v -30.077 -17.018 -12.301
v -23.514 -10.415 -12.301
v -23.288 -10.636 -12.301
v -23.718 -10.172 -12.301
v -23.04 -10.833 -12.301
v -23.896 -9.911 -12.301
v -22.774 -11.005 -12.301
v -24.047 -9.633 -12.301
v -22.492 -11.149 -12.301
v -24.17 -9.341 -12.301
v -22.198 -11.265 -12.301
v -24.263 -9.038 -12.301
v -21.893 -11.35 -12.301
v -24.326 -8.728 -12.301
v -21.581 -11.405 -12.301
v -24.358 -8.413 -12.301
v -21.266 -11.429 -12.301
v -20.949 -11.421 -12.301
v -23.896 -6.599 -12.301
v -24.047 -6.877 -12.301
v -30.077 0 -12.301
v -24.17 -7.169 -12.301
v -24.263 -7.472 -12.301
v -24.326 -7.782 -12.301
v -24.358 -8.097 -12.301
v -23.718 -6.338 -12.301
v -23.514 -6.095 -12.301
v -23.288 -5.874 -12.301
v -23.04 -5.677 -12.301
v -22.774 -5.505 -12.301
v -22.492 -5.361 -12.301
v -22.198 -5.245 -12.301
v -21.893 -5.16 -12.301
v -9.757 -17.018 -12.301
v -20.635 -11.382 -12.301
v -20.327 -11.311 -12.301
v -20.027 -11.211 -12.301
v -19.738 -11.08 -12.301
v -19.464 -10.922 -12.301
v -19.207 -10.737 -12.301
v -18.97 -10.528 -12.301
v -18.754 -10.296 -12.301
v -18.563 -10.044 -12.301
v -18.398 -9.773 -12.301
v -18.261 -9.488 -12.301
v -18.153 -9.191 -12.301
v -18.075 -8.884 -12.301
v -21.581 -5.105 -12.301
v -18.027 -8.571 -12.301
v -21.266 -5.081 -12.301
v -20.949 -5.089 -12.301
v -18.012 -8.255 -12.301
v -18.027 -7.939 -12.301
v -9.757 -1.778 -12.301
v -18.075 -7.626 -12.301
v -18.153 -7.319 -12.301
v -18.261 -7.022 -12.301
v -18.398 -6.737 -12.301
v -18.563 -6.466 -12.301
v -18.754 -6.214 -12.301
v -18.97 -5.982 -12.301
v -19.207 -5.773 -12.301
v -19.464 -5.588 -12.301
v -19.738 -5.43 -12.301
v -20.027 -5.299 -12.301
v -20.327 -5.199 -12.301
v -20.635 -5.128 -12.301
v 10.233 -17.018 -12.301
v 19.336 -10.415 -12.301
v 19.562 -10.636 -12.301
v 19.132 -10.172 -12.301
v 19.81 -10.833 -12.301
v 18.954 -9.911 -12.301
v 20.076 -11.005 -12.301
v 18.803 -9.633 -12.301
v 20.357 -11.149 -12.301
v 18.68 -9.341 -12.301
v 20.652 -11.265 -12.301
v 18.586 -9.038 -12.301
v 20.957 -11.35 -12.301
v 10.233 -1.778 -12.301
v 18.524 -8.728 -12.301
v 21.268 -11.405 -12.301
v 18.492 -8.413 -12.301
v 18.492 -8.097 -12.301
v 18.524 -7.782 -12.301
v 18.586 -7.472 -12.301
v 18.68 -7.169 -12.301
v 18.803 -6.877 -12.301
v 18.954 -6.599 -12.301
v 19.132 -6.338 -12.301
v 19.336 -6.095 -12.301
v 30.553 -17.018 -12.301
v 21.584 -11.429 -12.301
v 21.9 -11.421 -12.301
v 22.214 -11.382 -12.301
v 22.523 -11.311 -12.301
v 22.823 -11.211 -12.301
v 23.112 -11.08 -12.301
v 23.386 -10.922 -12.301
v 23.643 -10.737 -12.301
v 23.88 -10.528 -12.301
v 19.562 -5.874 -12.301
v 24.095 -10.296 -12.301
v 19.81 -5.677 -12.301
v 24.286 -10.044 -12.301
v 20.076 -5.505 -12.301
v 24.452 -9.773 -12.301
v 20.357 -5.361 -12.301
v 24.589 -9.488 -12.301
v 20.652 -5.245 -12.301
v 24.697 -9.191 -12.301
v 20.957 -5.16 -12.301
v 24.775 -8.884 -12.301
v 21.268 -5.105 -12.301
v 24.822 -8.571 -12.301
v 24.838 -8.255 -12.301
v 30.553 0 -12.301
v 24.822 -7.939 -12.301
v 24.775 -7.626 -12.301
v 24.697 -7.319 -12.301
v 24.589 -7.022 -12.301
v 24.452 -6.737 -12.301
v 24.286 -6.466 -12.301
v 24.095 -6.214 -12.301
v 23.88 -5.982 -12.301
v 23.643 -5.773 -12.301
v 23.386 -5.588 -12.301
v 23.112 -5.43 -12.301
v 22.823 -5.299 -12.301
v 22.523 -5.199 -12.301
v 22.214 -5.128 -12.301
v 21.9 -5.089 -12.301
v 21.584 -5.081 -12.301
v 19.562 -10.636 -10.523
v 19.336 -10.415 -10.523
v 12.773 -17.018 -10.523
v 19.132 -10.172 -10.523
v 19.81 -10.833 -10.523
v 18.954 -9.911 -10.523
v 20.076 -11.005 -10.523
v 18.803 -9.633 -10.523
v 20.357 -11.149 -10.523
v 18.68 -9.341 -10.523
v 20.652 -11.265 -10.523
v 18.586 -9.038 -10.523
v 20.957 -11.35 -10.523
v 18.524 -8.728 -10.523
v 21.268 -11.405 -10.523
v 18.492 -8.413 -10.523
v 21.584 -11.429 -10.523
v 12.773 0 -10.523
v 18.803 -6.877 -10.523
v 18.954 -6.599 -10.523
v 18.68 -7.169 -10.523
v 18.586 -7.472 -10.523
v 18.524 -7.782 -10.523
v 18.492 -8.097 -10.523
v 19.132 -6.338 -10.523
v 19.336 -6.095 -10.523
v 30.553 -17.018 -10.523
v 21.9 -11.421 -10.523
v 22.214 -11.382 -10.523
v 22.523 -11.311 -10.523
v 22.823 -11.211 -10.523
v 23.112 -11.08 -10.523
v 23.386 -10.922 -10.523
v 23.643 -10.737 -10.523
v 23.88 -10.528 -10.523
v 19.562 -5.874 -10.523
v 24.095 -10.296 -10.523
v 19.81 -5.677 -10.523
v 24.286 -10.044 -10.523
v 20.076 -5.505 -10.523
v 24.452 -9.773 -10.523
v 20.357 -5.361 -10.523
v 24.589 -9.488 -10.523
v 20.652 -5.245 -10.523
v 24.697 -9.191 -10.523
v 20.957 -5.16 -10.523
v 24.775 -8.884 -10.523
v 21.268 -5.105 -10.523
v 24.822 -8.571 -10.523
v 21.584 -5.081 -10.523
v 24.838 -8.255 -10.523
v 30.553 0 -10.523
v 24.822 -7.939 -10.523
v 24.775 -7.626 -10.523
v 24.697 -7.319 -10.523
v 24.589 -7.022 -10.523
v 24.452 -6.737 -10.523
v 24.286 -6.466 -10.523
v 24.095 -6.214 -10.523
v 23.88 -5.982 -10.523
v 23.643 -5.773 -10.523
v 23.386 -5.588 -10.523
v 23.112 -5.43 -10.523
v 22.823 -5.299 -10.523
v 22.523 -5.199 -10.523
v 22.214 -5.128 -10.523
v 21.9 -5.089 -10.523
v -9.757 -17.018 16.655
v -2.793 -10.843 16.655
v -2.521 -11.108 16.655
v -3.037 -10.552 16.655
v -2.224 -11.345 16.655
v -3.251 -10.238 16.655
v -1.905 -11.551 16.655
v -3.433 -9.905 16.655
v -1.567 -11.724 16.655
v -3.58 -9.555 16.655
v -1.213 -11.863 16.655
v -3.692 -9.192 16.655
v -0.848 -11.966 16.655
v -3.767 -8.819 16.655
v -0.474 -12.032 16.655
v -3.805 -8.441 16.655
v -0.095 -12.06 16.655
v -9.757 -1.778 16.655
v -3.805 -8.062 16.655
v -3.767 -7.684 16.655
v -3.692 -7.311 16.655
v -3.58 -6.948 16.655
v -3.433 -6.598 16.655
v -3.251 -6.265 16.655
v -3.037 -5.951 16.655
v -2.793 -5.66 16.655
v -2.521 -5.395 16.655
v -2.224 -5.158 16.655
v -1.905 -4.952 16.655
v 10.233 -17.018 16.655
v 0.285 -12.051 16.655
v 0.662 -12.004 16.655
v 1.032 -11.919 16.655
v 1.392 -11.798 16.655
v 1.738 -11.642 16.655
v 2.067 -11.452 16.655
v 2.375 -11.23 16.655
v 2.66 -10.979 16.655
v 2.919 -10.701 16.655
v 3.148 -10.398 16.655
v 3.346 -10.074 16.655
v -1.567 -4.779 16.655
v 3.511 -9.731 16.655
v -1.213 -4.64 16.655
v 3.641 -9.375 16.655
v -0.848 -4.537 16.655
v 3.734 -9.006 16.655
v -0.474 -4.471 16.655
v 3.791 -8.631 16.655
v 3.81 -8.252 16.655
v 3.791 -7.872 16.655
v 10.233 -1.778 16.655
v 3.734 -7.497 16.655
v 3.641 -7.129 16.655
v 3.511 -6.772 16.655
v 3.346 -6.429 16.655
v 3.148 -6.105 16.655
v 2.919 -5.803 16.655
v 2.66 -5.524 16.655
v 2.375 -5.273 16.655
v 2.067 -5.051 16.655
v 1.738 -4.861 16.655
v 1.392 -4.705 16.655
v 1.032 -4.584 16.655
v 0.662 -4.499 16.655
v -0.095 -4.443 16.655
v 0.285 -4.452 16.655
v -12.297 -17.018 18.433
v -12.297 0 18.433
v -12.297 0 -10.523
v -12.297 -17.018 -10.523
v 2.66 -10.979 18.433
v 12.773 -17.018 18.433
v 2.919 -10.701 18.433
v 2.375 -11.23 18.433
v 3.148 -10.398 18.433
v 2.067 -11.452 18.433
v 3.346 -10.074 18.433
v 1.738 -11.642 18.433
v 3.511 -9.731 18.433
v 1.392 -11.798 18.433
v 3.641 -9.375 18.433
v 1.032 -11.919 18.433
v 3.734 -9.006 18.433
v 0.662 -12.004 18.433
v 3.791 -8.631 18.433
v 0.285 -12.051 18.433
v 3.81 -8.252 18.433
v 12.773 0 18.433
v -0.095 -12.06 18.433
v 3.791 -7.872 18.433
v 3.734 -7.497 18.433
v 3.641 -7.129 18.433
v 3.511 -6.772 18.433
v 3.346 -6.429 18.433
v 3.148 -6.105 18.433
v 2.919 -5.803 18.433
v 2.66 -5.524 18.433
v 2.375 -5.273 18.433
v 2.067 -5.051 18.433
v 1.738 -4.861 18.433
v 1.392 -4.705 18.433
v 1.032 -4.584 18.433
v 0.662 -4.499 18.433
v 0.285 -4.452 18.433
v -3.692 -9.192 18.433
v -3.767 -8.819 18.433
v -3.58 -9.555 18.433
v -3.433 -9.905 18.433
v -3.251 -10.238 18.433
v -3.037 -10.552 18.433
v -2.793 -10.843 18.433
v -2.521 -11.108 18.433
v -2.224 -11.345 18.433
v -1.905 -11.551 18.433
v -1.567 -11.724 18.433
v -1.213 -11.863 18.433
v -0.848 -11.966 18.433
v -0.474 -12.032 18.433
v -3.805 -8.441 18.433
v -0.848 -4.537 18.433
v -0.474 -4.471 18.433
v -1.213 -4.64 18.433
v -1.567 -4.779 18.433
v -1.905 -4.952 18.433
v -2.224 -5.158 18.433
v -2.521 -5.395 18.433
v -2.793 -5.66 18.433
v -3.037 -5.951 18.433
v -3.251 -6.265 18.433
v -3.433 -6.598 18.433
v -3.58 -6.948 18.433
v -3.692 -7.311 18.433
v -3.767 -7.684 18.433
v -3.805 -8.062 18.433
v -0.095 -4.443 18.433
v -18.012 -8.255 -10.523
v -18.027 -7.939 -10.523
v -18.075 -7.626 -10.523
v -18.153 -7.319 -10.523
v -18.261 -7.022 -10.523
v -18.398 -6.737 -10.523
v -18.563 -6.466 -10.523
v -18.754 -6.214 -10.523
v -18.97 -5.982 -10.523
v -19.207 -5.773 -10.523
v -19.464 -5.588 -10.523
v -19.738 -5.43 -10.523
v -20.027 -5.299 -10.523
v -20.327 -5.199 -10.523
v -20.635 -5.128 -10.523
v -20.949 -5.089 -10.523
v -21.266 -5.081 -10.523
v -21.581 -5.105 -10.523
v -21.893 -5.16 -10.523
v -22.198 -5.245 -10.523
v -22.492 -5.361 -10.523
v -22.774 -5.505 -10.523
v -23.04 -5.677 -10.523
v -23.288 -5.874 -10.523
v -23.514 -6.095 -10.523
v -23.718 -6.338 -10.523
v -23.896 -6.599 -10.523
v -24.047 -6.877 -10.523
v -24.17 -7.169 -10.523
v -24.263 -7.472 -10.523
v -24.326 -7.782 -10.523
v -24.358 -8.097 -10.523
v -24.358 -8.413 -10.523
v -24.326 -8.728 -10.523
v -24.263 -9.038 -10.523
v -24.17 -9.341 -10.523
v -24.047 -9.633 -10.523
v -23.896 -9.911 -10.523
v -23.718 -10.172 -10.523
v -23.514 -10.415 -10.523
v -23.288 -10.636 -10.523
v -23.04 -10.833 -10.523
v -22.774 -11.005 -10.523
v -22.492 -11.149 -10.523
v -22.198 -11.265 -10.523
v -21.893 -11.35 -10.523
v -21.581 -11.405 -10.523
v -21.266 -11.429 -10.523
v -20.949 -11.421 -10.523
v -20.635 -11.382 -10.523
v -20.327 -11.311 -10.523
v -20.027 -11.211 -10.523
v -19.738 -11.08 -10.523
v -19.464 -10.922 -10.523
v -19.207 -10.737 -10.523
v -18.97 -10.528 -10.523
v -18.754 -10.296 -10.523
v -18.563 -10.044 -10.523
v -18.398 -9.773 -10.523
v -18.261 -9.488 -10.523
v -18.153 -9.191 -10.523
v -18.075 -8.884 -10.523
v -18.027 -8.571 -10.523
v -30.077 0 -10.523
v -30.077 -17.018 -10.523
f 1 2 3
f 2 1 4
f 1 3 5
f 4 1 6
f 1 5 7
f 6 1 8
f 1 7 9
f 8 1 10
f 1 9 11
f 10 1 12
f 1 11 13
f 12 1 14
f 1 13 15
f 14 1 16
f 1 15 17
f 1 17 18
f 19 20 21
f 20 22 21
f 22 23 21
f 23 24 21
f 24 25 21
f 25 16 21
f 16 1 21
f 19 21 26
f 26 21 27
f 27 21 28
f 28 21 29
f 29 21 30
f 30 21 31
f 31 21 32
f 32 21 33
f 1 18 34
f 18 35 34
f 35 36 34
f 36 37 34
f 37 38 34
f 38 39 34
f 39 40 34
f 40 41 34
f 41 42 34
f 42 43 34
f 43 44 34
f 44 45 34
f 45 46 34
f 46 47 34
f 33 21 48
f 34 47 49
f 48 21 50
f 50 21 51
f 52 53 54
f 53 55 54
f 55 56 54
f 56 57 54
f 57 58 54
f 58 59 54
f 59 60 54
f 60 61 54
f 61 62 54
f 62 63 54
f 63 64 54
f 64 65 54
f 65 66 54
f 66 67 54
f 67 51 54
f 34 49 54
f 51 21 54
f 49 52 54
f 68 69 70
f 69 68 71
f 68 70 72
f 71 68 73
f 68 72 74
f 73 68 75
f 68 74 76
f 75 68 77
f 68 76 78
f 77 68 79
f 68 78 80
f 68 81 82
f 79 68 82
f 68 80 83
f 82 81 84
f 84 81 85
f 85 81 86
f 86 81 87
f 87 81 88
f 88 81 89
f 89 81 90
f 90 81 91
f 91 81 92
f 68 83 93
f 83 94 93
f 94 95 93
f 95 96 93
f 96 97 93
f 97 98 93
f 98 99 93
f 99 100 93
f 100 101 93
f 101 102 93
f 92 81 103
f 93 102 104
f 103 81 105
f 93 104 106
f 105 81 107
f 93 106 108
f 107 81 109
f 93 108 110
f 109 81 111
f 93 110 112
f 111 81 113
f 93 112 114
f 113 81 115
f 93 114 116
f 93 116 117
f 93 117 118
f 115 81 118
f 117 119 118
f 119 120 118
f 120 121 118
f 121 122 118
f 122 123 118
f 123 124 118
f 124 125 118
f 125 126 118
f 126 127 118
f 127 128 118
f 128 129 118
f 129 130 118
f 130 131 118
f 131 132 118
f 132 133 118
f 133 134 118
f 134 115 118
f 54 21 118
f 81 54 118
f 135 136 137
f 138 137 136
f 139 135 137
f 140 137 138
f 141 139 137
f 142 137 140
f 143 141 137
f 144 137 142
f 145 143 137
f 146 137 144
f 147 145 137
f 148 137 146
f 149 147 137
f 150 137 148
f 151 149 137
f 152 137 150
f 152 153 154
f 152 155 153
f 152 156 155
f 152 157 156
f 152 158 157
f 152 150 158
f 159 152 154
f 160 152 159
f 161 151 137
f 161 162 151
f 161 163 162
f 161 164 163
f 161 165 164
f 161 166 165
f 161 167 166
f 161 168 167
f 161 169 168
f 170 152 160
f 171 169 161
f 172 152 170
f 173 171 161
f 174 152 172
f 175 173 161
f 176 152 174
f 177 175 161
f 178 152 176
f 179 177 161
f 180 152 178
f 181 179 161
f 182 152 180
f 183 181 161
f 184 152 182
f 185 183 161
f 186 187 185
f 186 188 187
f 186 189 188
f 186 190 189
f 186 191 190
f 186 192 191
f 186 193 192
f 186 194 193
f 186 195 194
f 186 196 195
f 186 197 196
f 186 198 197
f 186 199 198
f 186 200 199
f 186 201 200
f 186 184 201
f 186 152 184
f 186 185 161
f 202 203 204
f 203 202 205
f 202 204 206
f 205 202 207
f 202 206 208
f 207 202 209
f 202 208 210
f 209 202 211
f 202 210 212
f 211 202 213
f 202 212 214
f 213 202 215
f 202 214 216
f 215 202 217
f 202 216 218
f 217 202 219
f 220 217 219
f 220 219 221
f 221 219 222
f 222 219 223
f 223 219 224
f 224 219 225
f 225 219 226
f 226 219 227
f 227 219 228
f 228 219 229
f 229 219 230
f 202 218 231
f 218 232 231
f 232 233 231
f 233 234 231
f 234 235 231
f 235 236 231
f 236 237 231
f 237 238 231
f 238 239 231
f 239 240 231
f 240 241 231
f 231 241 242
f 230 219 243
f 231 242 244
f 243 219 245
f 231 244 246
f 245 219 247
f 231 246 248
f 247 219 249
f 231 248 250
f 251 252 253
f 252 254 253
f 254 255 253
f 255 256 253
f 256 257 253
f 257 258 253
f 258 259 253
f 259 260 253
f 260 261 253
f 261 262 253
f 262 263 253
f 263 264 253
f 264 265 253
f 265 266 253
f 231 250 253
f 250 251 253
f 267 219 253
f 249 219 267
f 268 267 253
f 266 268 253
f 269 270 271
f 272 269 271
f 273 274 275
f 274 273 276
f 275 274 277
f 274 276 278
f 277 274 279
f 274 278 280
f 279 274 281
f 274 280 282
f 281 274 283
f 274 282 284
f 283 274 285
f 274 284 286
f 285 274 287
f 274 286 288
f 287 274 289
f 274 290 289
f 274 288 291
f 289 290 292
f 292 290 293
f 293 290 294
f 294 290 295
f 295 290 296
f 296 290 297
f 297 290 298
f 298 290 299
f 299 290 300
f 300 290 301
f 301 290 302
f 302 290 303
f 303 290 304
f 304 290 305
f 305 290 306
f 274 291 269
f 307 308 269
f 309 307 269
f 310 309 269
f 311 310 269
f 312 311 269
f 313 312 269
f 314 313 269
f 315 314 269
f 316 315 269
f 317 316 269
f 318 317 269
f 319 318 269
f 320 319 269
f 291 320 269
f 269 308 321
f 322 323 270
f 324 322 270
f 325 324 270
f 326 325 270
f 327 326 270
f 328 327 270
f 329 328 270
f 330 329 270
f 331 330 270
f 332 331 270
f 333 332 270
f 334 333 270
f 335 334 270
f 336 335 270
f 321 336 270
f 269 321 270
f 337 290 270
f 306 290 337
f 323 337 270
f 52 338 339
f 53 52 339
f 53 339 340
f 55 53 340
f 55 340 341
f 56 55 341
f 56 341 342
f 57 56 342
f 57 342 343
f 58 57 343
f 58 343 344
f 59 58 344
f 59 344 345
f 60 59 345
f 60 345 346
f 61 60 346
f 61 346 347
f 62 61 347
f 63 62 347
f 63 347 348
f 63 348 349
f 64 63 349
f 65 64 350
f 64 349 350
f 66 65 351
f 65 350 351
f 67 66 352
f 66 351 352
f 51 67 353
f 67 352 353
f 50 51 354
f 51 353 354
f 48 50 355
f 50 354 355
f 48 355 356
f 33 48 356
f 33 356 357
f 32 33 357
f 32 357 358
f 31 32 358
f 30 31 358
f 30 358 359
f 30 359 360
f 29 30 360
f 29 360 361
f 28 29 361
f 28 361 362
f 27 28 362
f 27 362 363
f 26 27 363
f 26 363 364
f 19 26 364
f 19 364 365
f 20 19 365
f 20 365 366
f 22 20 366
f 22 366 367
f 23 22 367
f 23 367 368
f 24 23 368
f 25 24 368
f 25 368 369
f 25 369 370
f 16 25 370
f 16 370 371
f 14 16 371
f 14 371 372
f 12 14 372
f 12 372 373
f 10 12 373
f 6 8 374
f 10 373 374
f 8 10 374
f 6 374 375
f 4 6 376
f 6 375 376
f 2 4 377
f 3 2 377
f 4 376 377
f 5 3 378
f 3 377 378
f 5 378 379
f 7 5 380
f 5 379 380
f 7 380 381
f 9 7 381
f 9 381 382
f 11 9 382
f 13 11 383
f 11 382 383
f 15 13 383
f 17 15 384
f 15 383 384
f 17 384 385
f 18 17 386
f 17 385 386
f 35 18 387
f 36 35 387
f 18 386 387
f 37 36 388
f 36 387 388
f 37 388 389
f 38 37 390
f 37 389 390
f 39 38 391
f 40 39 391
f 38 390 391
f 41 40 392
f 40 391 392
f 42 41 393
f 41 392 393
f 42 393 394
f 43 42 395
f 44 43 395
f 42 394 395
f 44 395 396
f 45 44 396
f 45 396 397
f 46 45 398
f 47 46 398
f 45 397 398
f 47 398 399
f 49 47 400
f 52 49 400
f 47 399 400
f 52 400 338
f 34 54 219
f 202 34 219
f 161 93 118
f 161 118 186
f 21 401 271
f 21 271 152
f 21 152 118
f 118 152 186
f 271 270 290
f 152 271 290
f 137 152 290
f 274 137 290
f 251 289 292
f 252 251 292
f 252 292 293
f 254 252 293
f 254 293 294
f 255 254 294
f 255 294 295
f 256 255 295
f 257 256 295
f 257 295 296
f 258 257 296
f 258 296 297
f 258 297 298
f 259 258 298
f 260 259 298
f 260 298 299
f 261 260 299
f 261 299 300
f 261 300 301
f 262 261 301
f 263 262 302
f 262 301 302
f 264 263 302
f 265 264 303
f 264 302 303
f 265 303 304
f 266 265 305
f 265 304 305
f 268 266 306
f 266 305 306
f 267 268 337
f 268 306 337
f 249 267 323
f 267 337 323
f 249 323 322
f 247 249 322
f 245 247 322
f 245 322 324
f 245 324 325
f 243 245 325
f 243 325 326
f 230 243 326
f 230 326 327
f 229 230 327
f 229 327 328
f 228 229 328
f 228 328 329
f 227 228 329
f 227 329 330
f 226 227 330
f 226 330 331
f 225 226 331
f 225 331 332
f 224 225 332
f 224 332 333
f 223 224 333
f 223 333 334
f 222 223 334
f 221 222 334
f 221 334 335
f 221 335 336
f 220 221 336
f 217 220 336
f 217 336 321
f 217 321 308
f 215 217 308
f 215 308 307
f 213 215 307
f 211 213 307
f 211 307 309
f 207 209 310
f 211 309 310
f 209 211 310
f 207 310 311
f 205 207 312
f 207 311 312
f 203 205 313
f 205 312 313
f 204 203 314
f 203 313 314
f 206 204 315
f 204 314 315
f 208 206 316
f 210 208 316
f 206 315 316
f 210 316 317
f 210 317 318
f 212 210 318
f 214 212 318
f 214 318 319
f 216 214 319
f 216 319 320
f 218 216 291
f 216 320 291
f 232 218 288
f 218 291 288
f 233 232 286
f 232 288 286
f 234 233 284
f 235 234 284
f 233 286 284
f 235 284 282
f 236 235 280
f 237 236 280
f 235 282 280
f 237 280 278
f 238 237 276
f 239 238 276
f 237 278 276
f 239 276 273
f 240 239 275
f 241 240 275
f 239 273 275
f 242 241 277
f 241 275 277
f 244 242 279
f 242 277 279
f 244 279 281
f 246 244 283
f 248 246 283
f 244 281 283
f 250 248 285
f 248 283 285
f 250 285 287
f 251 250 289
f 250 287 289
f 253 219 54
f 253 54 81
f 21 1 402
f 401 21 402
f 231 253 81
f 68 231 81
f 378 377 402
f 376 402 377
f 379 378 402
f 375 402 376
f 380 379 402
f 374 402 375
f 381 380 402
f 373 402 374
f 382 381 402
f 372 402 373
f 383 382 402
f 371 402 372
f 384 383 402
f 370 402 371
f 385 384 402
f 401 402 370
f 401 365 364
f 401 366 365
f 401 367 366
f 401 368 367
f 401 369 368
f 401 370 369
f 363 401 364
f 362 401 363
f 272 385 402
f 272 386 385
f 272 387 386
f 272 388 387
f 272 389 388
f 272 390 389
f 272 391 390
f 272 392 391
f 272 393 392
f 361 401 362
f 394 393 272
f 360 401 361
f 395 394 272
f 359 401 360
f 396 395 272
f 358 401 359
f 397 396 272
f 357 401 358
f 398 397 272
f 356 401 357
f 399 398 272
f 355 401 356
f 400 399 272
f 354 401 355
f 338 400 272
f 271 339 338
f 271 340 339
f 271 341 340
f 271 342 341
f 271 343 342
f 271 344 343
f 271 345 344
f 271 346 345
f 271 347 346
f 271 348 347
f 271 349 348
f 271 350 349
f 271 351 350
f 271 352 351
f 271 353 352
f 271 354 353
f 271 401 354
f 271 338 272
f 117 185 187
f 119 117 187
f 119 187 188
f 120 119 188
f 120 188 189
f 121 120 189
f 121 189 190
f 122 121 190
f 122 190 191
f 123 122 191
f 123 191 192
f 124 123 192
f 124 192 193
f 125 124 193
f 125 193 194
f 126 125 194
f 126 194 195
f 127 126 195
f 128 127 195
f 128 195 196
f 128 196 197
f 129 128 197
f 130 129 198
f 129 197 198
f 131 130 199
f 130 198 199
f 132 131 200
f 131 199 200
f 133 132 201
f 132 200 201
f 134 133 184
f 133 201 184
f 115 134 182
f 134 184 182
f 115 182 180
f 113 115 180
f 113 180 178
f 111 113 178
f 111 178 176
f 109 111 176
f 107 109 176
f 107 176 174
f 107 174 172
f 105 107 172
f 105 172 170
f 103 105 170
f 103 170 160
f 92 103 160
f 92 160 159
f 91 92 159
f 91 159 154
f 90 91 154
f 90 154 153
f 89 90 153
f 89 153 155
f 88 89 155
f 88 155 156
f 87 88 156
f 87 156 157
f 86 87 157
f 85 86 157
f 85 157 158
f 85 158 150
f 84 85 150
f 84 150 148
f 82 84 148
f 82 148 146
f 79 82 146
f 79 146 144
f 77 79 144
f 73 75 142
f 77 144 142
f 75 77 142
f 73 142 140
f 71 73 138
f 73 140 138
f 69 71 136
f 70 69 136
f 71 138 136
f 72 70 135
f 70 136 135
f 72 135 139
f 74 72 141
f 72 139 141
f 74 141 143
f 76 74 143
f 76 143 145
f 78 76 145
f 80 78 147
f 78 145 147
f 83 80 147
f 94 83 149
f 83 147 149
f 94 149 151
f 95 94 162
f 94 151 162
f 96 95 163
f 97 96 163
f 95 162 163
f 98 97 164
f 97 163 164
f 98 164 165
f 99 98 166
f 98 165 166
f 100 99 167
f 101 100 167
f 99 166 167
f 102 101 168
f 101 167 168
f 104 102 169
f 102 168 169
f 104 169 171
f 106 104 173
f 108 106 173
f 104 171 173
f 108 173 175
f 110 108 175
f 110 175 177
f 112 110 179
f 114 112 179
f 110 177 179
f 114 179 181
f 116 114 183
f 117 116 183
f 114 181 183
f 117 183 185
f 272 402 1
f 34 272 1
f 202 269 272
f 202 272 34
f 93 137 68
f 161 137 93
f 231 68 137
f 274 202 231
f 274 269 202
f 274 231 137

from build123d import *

# Parameters (mm, degrees)
F0_W     = 17.78
F0_H     = 1.778
F1_DEPTH = 17.018
F0_W_2   = 19.9898
F0_H_2   = 28.956
F2_DEPTH = 1.778
F5_R     = 3.175
F4_R     = 3.175
F3_R     = 3.81
F6_DEPTH = 25.4


with BuildPart() as f1:
    # F0 (on Front) → F1 (new body)
    with BuildSketch(Plane.XZ):
        Polygon((-12.296648, -10.522948), (-12.296648, -12.300948), (-9.756648, -12.300948), (-9.756648, 16.655052), (10.233152, 16.655052), (10.233152, -12.300948), (12.773152, -12.300948), (12.773152, -10.522948), (12.773152, 18.433052), (-12.296648, 18.433052), align=None)
        with Locations((-21.186648, -11.411948)):
            Rectangle(F0_W, F0_H)
        with Locations((21.663152, -11.411948)):
            Rectangle(F0_W, F0_H)
    extrude(amount=F1_DEPTH)

    # F0 (on Front) → F2 (join)
    with BuildSketch(Plane.XZ):
        with Locations((0.238252, 2.177052)):
            Rectangle(F0_W_2, F0_H_2)
    extrude(amount=F2_DEPTH)

    # F5 (on face) + F4 (on face) + F3 (on face) → F6 (cut)
    with BuildSketch(Plane.XY.offset(-10.522948)):
        with Locations((21.663152, -8.255)):
            Circle(F5_R)
    with BuildSketch(Plane.XY.offset(-10.522948)):
        with Locations((-21.186648, -8.255)):
            Circle(F4_R)
    with BuildSketch(Plane.XY.offset(18.433052)):
        with Locations((0, -8.251561)):
            Circle(F3_R)
    extrude(amount=-F6_DEPTH, mode=Mode.SUBTRACT)


solid = f1.part
